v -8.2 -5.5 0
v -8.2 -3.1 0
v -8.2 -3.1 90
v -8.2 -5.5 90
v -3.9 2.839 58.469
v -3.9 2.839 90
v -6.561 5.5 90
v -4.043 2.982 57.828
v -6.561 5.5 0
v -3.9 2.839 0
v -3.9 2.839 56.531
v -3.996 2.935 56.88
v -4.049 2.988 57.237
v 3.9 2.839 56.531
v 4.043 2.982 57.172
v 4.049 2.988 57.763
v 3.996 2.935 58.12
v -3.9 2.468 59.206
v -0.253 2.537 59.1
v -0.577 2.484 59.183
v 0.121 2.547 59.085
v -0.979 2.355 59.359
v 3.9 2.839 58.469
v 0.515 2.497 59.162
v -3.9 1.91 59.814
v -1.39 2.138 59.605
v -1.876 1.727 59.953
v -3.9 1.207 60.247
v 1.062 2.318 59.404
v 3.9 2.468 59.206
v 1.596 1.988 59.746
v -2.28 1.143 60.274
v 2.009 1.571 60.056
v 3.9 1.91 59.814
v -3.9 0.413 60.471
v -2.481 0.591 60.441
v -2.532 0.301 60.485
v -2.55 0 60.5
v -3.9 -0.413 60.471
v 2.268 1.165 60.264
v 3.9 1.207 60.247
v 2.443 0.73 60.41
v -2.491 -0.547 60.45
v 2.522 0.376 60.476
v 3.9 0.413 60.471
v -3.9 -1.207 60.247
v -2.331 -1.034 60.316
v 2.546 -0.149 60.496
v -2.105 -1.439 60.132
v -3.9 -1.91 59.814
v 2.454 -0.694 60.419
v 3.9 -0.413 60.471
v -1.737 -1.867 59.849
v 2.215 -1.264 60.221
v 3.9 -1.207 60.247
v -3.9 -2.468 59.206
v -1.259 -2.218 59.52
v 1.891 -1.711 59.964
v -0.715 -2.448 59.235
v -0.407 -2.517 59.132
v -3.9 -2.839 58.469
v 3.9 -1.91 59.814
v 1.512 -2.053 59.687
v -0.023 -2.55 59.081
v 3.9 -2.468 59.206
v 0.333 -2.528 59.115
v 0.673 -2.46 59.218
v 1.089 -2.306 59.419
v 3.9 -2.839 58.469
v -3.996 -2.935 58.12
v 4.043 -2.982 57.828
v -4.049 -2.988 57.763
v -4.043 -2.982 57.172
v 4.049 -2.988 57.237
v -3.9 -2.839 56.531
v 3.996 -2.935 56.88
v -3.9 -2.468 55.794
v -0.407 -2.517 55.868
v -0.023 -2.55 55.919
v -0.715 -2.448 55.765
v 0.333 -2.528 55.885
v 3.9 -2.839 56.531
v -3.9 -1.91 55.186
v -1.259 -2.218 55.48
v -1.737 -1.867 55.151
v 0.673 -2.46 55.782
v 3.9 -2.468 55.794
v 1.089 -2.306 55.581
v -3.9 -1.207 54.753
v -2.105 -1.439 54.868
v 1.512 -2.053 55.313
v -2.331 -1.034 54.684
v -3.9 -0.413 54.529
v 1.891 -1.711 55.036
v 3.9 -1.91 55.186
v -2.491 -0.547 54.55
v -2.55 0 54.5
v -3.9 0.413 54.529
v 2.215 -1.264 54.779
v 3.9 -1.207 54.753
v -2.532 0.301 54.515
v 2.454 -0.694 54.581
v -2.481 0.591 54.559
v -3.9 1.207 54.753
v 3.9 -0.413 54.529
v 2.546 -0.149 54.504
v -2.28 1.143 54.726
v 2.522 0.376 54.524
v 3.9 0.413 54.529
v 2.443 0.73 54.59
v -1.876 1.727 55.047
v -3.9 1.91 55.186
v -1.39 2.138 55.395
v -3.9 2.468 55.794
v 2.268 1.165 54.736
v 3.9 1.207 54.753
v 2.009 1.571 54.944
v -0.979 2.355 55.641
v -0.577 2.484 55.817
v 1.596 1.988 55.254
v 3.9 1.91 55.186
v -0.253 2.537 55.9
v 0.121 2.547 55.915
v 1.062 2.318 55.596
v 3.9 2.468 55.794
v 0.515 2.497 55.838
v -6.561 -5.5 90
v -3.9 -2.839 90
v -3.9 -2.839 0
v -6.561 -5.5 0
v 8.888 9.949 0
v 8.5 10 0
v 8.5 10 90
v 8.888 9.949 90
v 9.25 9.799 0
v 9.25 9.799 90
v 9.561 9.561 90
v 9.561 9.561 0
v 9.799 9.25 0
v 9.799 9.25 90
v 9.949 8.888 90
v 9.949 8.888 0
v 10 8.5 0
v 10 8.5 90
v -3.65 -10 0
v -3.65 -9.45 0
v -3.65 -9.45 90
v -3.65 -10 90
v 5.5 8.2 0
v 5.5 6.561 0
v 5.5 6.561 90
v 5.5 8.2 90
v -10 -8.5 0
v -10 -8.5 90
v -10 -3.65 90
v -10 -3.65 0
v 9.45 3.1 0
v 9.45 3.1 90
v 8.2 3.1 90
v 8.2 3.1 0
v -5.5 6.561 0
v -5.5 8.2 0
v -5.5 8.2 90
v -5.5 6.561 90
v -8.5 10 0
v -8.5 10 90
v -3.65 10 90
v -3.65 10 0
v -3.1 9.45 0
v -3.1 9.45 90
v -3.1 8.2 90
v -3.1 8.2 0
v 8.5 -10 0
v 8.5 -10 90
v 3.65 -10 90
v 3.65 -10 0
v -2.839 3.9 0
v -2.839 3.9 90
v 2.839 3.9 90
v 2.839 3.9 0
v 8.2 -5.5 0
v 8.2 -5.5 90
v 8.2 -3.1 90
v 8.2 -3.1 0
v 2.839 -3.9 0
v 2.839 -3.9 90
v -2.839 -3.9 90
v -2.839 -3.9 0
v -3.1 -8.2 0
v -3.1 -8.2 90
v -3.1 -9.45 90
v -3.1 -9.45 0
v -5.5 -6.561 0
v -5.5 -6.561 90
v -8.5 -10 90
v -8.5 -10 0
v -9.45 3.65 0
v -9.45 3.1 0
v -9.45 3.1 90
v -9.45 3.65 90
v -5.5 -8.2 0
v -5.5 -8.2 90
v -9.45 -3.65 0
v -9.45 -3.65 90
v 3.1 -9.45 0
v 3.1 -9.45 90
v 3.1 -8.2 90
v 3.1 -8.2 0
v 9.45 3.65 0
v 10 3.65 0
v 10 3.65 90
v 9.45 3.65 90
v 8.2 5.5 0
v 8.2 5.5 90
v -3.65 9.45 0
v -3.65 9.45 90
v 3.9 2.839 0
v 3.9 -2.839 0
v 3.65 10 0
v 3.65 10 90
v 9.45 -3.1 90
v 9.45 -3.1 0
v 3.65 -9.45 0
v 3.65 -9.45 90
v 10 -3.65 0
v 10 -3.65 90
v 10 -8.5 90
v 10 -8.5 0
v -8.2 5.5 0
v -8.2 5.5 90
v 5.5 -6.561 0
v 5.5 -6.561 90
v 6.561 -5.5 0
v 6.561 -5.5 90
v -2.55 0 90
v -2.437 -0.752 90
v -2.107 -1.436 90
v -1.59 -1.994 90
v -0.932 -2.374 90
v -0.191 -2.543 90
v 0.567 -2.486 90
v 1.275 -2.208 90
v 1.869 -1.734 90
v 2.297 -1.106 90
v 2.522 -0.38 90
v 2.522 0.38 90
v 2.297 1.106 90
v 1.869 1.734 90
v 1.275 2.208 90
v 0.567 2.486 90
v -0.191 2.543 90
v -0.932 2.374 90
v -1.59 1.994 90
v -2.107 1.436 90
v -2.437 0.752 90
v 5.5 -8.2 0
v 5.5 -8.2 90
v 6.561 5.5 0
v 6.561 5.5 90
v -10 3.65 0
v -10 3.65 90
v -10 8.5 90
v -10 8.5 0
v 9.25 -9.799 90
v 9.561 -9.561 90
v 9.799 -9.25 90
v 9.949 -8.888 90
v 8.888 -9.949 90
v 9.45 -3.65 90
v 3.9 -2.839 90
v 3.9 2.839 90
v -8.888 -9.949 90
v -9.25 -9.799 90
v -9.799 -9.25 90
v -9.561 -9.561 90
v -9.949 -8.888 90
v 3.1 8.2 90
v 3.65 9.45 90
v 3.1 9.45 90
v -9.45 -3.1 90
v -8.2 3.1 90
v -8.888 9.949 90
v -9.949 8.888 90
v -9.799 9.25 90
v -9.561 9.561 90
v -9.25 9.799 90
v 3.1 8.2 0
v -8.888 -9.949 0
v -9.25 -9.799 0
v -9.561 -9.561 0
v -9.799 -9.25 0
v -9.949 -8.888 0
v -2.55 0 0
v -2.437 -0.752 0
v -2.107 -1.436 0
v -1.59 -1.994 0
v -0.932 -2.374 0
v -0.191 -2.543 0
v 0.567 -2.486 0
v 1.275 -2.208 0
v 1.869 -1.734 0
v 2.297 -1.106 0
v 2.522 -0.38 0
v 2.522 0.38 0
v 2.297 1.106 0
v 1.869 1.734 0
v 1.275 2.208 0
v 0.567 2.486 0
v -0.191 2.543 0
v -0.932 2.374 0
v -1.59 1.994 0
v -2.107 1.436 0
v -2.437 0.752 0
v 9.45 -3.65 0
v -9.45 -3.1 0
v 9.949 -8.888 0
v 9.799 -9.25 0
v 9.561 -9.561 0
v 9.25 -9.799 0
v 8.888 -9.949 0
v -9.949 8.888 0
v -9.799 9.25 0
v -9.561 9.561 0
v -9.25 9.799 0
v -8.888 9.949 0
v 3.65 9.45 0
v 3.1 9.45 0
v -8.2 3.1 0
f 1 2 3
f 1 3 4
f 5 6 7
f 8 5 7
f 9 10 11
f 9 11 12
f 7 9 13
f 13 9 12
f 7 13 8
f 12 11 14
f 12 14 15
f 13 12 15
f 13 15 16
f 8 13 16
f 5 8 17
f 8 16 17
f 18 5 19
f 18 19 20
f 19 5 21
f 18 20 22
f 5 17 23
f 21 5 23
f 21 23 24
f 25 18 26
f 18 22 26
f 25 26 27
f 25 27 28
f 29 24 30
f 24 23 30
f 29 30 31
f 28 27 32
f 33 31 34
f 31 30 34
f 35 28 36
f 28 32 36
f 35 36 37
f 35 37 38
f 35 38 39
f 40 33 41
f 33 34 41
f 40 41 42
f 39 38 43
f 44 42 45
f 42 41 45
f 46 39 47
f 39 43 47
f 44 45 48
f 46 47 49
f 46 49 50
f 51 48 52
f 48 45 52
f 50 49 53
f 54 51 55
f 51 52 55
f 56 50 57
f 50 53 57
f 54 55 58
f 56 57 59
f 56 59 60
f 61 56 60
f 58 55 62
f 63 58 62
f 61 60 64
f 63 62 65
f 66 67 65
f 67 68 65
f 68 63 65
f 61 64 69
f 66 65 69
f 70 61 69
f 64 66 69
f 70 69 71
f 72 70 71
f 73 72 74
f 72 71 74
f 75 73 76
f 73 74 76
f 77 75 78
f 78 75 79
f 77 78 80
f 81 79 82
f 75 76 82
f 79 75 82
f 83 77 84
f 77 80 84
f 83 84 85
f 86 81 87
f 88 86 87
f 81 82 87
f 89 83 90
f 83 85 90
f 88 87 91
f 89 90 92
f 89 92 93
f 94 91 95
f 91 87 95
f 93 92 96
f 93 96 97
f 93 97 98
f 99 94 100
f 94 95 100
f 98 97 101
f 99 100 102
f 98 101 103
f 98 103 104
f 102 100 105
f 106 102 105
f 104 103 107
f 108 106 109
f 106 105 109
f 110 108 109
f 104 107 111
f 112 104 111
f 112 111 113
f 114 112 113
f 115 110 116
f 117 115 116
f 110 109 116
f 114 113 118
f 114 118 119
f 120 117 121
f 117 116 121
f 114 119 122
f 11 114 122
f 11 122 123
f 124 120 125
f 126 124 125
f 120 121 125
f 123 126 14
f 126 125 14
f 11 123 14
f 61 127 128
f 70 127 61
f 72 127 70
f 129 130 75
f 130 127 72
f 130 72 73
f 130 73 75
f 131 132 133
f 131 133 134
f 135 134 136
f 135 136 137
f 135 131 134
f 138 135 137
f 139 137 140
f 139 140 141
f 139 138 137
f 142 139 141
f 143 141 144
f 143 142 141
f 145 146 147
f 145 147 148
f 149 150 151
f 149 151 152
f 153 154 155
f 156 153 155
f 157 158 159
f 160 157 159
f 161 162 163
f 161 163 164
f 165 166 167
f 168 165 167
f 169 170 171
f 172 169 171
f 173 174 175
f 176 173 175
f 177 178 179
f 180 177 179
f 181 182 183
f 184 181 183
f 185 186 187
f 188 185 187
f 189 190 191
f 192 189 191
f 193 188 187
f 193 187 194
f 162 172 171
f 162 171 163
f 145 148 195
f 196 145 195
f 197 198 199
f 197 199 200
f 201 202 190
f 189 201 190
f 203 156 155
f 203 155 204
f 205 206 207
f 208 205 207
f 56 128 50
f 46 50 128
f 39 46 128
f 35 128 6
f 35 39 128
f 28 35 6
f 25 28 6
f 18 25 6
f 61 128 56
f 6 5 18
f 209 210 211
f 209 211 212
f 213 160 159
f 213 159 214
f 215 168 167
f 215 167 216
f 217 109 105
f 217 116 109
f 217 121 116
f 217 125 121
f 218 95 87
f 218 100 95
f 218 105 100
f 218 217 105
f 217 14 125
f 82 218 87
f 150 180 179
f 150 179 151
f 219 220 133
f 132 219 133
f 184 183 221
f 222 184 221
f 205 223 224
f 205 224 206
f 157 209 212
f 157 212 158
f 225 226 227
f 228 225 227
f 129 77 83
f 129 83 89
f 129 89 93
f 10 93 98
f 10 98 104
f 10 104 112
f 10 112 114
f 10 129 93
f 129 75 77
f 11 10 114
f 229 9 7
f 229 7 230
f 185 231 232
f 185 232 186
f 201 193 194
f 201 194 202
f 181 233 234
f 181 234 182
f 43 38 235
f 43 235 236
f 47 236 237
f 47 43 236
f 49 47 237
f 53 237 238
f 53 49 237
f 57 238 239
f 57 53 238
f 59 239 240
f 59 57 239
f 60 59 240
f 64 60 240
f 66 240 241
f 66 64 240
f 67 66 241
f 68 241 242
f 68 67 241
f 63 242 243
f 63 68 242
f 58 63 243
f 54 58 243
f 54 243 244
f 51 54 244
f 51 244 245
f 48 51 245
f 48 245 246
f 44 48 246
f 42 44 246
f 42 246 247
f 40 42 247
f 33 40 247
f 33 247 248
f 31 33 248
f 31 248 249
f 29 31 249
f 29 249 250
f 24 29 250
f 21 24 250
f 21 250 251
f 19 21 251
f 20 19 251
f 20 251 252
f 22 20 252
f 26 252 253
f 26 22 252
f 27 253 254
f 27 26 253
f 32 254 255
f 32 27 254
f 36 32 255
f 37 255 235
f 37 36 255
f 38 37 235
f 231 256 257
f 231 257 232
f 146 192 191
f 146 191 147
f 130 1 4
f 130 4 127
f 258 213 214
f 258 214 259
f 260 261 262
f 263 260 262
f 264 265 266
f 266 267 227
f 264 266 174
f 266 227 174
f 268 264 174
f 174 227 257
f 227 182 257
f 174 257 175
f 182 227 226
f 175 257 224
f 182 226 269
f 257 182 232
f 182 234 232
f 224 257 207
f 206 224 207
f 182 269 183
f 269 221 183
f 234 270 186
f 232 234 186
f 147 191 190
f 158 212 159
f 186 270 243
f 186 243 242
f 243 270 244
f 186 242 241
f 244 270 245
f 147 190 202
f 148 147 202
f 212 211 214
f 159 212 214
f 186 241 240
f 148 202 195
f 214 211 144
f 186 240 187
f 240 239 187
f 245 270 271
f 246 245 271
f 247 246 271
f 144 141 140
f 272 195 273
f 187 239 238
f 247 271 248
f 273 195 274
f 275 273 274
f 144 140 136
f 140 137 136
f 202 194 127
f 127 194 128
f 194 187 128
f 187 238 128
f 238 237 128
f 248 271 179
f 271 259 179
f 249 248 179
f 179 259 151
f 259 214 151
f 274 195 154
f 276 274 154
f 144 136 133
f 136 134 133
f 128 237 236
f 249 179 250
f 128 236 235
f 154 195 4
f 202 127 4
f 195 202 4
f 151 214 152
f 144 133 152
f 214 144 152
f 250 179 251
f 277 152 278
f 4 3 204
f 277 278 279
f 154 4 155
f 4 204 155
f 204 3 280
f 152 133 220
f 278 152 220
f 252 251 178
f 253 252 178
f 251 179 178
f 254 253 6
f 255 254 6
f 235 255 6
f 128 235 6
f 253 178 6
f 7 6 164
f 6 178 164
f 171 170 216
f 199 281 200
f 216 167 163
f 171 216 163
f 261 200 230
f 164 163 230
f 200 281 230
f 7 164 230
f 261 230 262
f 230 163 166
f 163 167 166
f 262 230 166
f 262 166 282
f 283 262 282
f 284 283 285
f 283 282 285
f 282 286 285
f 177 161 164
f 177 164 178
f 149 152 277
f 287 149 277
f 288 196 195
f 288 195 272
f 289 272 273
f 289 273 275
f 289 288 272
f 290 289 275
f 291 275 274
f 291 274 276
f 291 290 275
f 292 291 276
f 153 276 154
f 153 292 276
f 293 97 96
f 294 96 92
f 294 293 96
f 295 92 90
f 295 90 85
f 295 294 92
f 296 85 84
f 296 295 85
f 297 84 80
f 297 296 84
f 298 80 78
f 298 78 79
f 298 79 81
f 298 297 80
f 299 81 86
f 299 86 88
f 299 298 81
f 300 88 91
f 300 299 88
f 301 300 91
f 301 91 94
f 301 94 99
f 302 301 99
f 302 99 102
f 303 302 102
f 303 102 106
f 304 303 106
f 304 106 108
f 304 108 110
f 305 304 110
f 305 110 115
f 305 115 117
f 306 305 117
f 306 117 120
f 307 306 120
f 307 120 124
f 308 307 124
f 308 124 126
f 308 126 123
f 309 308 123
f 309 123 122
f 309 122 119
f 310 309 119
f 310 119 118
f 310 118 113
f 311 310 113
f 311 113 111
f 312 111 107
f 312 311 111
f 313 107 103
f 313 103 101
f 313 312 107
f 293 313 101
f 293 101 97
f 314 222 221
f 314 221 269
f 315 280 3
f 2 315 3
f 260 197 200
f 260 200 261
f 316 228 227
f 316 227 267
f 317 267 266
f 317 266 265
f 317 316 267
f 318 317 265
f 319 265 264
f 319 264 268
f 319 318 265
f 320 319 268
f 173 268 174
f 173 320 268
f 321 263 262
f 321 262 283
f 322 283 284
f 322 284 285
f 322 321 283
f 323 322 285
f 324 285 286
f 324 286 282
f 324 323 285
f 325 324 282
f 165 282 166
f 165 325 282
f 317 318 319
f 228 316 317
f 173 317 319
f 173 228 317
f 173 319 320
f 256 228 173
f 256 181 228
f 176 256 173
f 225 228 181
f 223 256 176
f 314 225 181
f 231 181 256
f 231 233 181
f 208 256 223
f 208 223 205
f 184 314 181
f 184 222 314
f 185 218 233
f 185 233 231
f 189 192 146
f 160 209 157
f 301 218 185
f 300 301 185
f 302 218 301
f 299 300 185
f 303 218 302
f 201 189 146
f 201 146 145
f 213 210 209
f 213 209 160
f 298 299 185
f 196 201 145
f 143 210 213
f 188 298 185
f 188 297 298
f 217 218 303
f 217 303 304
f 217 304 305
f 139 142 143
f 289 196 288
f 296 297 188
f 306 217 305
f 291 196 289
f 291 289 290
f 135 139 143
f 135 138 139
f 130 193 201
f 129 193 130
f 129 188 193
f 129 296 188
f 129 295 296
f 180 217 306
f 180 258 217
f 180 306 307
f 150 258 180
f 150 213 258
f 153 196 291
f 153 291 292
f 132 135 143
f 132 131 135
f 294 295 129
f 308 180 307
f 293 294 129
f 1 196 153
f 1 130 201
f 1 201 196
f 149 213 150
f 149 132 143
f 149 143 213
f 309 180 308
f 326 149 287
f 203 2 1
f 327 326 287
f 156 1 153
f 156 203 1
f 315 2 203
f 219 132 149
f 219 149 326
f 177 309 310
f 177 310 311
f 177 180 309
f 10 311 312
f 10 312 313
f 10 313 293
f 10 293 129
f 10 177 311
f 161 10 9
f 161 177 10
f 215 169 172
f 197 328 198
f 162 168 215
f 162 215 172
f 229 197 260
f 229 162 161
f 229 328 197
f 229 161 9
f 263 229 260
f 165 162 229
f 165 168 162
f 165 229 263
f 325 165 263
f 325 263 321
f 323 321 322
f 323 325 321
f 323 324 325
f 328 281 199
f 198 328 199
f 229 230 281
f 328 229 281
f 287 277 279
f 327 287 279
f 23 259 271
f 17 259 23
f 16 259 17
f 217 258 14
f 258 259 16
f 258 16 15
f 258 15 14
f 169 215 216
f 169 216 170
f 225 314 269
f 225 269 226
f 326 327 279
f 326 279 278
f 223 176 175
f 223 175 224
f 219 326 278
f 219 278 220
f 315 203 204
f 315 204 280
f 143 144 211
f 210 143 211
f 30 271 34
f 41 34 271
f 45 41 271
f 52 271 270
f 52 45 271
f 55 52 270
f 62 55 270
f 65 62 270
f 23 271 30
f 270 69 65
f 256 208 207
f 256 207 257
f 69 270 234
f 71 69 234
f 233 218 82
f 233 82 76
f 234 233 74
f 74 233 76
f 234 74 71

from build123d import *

# Parameters (mm, degrees)
SKETCH_2_R          = 2.55
EXTRUDE_1_DEPTH     = 90
SKETCH_3_R          = 3
CUT_EXTRUDE_1_DEPTH = 93.736184955


with BuildPart() as part:
    # 草图2 → 凸台-拉伸1 (new body)
    with BuildSketch(Plane.XY):
        with BuildLine():
            Line((-3.9, 2.839339828), (-6.560660172, 5.5))
            Line((-6.560660172, 5.5), (-8.2, 5.5))
            Line((-8.2, 5.5), (-8.2, 3.1))
            Line((-8.2, 3.1), (-9.45, 3.1))
            Line((-9.45, 3.1), (-9.45, 3.65))
            Line((-9.45, 3.65), (-10, 3.65))
            Line((-10, 3.65), (-10, 8.5))
            ThreePointArc((-10, 8.5), (-9.560660172, 9.560660172), (-8.5, 10))
            Line((-8.5, 10), (-3.65, 10))
            Line((-3.65, 10), (-3.65, 9.45))
            Line((-3.65, 9.45), (-3.1, 9.45))
            Line((-3.1, 9.45), (-3.1, 8.2))
            Line((-3.1, 8.2), (-5.5, 8.2))
            Line((-5.5, 8.2), (-5.5, 6.560660172))
            Line((-5.5, 6.560660172), (-2.839339828, 3.9))
            Line((-2.839339828, 3.9), (2.839339828, 3.9))
            Line((2.839339828, 3.9), (5.5, 6.560660172))
            Line((5.5, 6.560660172), (5.5, 8.2))
            Line((5.5, 8.2), (3.1, 8.2))
            Line((3.1, 8.2), (3.1, 9.45))
            Line((3.1, 9.45), (3.65, 9.45))
            Line((3.65, 9.45), (3.65, 10))
            Line((3.65, 10), (8.5, 10))
            ThreePointArc((8.5, 10), (9.560660172, 9.560660172), (10, 8.5))
            Line((10, 8.5), (10, 3.65))
            Line((10, 3.65), (9.45, 3.65))
            Line((9.45, 3.65), (9.45, 3.1))
            Line((9.45, 3.1), (8.2, 3.1))
            Line((8.2, 3.1), (8.2, 5.5))
            Line((8.2, 5.5), (6.560660172, 5.5))
            Line((6.560660172, 5.5), (3.9, 2.839339828))
            Line((3.9, 2.839339828), (3.9, -2.839339828))
            Line((3.9, -2.839339828), (6.560660172, -5.5))
            Line((6.560660172, -5.5), (8.2, -5.5))
            Line((8.2, -5.5), (8.2, -3.1))
            Line((8.2, -3.1), (9.45, -3.1))
            Line((9.45, -3.1), (9.45, -3.65))
            Line((9.45, -3.65), (10, -3.65))
            Line((10, -3.65), (10, -8.5))
            ThreePointArc((10, -8.5), (9.560660172, -9.560660172), (8.5, -10))
            Line((8.5, -10), (3.65, -10))
            Line((3.65, -10), (3.65, -9.45))
            Line((3.65, -9.45), (3.1, -9.45))
            Line((3.1, -9.45), (3.1, -8.2))
            Line((3.1, -8.2), (5.5, -8.2))
            Line((5.5, -8.2), (5.5, -6.560660172))
            Line((5.5, -6.560660172), (2.839339828, -3.9))
            Line((2.839339828, -3.9), (-2.839339828, -3.9))
            Line((-2.839339828, -3.9), (-5.5, -6.560660172))
            Line((-5.5, -6.560660172), (-5.5, -8.2))
            Line((-5.5, -8.2), (-3.1, -8.2))
            Line((-3.1, -8.2), (-3.1, -9.45))
            Line((-3.1, -9.45), (-3.65, -9.45))
            Line((-3.65, -9.45), (-3.65, -10))
            Line((-3.65, -10), (-8.5, -10))
            ThreePointArc((-8.5, -10), (-9.560660172, -9.560660172), (-10, -8.5))
            Line((-10, -8.5), (-10, -3.65))
            Line((-10, -3.65), (-9.45, -3.65))
            Line((-9.45, -3.65), (-9.45, -3.1))
            Line((-9.45, -3.1), (-8.2, -3.1))
            Line((-8.2, -3.1), (-8.2, -5.5))
            Line((-8.2, -5.5), (-6.560660172, -5.5))
            Line((-6.560660172, -5.5), (-3.9, -2.839339828))
            Line((-3.9, -2.839339828), (-3.9, 2.839339828))
        make_face()
        with Locations(Location((0, 0, 0), (0, 0, 180))):
            Circle(SKETCH_2_R, mode=Mode.SUBTRACT)
    extrude(amount=EXTRUDE_1_DEPTH)

    # 草图3 → 切除-拉伸1 (cut, through all)
    with BuildSketch(Plane(origin=(10, 0, 0), x_dir=(0, 0, -1), z_dir=(1, 0, 0))):
        with Locations(Location((-57.5, 0, 0), (0, 0, 71.16400384))):
            Circle(SKETCH_3_R)
        with Locations((-302.5, 0)):
            Circle(SKETCH_3_R)
    extrude(amount=-CUT_EXTRUDE_1_DEPTH, mode=Mode.SUBTRACT)


solid = part.part
